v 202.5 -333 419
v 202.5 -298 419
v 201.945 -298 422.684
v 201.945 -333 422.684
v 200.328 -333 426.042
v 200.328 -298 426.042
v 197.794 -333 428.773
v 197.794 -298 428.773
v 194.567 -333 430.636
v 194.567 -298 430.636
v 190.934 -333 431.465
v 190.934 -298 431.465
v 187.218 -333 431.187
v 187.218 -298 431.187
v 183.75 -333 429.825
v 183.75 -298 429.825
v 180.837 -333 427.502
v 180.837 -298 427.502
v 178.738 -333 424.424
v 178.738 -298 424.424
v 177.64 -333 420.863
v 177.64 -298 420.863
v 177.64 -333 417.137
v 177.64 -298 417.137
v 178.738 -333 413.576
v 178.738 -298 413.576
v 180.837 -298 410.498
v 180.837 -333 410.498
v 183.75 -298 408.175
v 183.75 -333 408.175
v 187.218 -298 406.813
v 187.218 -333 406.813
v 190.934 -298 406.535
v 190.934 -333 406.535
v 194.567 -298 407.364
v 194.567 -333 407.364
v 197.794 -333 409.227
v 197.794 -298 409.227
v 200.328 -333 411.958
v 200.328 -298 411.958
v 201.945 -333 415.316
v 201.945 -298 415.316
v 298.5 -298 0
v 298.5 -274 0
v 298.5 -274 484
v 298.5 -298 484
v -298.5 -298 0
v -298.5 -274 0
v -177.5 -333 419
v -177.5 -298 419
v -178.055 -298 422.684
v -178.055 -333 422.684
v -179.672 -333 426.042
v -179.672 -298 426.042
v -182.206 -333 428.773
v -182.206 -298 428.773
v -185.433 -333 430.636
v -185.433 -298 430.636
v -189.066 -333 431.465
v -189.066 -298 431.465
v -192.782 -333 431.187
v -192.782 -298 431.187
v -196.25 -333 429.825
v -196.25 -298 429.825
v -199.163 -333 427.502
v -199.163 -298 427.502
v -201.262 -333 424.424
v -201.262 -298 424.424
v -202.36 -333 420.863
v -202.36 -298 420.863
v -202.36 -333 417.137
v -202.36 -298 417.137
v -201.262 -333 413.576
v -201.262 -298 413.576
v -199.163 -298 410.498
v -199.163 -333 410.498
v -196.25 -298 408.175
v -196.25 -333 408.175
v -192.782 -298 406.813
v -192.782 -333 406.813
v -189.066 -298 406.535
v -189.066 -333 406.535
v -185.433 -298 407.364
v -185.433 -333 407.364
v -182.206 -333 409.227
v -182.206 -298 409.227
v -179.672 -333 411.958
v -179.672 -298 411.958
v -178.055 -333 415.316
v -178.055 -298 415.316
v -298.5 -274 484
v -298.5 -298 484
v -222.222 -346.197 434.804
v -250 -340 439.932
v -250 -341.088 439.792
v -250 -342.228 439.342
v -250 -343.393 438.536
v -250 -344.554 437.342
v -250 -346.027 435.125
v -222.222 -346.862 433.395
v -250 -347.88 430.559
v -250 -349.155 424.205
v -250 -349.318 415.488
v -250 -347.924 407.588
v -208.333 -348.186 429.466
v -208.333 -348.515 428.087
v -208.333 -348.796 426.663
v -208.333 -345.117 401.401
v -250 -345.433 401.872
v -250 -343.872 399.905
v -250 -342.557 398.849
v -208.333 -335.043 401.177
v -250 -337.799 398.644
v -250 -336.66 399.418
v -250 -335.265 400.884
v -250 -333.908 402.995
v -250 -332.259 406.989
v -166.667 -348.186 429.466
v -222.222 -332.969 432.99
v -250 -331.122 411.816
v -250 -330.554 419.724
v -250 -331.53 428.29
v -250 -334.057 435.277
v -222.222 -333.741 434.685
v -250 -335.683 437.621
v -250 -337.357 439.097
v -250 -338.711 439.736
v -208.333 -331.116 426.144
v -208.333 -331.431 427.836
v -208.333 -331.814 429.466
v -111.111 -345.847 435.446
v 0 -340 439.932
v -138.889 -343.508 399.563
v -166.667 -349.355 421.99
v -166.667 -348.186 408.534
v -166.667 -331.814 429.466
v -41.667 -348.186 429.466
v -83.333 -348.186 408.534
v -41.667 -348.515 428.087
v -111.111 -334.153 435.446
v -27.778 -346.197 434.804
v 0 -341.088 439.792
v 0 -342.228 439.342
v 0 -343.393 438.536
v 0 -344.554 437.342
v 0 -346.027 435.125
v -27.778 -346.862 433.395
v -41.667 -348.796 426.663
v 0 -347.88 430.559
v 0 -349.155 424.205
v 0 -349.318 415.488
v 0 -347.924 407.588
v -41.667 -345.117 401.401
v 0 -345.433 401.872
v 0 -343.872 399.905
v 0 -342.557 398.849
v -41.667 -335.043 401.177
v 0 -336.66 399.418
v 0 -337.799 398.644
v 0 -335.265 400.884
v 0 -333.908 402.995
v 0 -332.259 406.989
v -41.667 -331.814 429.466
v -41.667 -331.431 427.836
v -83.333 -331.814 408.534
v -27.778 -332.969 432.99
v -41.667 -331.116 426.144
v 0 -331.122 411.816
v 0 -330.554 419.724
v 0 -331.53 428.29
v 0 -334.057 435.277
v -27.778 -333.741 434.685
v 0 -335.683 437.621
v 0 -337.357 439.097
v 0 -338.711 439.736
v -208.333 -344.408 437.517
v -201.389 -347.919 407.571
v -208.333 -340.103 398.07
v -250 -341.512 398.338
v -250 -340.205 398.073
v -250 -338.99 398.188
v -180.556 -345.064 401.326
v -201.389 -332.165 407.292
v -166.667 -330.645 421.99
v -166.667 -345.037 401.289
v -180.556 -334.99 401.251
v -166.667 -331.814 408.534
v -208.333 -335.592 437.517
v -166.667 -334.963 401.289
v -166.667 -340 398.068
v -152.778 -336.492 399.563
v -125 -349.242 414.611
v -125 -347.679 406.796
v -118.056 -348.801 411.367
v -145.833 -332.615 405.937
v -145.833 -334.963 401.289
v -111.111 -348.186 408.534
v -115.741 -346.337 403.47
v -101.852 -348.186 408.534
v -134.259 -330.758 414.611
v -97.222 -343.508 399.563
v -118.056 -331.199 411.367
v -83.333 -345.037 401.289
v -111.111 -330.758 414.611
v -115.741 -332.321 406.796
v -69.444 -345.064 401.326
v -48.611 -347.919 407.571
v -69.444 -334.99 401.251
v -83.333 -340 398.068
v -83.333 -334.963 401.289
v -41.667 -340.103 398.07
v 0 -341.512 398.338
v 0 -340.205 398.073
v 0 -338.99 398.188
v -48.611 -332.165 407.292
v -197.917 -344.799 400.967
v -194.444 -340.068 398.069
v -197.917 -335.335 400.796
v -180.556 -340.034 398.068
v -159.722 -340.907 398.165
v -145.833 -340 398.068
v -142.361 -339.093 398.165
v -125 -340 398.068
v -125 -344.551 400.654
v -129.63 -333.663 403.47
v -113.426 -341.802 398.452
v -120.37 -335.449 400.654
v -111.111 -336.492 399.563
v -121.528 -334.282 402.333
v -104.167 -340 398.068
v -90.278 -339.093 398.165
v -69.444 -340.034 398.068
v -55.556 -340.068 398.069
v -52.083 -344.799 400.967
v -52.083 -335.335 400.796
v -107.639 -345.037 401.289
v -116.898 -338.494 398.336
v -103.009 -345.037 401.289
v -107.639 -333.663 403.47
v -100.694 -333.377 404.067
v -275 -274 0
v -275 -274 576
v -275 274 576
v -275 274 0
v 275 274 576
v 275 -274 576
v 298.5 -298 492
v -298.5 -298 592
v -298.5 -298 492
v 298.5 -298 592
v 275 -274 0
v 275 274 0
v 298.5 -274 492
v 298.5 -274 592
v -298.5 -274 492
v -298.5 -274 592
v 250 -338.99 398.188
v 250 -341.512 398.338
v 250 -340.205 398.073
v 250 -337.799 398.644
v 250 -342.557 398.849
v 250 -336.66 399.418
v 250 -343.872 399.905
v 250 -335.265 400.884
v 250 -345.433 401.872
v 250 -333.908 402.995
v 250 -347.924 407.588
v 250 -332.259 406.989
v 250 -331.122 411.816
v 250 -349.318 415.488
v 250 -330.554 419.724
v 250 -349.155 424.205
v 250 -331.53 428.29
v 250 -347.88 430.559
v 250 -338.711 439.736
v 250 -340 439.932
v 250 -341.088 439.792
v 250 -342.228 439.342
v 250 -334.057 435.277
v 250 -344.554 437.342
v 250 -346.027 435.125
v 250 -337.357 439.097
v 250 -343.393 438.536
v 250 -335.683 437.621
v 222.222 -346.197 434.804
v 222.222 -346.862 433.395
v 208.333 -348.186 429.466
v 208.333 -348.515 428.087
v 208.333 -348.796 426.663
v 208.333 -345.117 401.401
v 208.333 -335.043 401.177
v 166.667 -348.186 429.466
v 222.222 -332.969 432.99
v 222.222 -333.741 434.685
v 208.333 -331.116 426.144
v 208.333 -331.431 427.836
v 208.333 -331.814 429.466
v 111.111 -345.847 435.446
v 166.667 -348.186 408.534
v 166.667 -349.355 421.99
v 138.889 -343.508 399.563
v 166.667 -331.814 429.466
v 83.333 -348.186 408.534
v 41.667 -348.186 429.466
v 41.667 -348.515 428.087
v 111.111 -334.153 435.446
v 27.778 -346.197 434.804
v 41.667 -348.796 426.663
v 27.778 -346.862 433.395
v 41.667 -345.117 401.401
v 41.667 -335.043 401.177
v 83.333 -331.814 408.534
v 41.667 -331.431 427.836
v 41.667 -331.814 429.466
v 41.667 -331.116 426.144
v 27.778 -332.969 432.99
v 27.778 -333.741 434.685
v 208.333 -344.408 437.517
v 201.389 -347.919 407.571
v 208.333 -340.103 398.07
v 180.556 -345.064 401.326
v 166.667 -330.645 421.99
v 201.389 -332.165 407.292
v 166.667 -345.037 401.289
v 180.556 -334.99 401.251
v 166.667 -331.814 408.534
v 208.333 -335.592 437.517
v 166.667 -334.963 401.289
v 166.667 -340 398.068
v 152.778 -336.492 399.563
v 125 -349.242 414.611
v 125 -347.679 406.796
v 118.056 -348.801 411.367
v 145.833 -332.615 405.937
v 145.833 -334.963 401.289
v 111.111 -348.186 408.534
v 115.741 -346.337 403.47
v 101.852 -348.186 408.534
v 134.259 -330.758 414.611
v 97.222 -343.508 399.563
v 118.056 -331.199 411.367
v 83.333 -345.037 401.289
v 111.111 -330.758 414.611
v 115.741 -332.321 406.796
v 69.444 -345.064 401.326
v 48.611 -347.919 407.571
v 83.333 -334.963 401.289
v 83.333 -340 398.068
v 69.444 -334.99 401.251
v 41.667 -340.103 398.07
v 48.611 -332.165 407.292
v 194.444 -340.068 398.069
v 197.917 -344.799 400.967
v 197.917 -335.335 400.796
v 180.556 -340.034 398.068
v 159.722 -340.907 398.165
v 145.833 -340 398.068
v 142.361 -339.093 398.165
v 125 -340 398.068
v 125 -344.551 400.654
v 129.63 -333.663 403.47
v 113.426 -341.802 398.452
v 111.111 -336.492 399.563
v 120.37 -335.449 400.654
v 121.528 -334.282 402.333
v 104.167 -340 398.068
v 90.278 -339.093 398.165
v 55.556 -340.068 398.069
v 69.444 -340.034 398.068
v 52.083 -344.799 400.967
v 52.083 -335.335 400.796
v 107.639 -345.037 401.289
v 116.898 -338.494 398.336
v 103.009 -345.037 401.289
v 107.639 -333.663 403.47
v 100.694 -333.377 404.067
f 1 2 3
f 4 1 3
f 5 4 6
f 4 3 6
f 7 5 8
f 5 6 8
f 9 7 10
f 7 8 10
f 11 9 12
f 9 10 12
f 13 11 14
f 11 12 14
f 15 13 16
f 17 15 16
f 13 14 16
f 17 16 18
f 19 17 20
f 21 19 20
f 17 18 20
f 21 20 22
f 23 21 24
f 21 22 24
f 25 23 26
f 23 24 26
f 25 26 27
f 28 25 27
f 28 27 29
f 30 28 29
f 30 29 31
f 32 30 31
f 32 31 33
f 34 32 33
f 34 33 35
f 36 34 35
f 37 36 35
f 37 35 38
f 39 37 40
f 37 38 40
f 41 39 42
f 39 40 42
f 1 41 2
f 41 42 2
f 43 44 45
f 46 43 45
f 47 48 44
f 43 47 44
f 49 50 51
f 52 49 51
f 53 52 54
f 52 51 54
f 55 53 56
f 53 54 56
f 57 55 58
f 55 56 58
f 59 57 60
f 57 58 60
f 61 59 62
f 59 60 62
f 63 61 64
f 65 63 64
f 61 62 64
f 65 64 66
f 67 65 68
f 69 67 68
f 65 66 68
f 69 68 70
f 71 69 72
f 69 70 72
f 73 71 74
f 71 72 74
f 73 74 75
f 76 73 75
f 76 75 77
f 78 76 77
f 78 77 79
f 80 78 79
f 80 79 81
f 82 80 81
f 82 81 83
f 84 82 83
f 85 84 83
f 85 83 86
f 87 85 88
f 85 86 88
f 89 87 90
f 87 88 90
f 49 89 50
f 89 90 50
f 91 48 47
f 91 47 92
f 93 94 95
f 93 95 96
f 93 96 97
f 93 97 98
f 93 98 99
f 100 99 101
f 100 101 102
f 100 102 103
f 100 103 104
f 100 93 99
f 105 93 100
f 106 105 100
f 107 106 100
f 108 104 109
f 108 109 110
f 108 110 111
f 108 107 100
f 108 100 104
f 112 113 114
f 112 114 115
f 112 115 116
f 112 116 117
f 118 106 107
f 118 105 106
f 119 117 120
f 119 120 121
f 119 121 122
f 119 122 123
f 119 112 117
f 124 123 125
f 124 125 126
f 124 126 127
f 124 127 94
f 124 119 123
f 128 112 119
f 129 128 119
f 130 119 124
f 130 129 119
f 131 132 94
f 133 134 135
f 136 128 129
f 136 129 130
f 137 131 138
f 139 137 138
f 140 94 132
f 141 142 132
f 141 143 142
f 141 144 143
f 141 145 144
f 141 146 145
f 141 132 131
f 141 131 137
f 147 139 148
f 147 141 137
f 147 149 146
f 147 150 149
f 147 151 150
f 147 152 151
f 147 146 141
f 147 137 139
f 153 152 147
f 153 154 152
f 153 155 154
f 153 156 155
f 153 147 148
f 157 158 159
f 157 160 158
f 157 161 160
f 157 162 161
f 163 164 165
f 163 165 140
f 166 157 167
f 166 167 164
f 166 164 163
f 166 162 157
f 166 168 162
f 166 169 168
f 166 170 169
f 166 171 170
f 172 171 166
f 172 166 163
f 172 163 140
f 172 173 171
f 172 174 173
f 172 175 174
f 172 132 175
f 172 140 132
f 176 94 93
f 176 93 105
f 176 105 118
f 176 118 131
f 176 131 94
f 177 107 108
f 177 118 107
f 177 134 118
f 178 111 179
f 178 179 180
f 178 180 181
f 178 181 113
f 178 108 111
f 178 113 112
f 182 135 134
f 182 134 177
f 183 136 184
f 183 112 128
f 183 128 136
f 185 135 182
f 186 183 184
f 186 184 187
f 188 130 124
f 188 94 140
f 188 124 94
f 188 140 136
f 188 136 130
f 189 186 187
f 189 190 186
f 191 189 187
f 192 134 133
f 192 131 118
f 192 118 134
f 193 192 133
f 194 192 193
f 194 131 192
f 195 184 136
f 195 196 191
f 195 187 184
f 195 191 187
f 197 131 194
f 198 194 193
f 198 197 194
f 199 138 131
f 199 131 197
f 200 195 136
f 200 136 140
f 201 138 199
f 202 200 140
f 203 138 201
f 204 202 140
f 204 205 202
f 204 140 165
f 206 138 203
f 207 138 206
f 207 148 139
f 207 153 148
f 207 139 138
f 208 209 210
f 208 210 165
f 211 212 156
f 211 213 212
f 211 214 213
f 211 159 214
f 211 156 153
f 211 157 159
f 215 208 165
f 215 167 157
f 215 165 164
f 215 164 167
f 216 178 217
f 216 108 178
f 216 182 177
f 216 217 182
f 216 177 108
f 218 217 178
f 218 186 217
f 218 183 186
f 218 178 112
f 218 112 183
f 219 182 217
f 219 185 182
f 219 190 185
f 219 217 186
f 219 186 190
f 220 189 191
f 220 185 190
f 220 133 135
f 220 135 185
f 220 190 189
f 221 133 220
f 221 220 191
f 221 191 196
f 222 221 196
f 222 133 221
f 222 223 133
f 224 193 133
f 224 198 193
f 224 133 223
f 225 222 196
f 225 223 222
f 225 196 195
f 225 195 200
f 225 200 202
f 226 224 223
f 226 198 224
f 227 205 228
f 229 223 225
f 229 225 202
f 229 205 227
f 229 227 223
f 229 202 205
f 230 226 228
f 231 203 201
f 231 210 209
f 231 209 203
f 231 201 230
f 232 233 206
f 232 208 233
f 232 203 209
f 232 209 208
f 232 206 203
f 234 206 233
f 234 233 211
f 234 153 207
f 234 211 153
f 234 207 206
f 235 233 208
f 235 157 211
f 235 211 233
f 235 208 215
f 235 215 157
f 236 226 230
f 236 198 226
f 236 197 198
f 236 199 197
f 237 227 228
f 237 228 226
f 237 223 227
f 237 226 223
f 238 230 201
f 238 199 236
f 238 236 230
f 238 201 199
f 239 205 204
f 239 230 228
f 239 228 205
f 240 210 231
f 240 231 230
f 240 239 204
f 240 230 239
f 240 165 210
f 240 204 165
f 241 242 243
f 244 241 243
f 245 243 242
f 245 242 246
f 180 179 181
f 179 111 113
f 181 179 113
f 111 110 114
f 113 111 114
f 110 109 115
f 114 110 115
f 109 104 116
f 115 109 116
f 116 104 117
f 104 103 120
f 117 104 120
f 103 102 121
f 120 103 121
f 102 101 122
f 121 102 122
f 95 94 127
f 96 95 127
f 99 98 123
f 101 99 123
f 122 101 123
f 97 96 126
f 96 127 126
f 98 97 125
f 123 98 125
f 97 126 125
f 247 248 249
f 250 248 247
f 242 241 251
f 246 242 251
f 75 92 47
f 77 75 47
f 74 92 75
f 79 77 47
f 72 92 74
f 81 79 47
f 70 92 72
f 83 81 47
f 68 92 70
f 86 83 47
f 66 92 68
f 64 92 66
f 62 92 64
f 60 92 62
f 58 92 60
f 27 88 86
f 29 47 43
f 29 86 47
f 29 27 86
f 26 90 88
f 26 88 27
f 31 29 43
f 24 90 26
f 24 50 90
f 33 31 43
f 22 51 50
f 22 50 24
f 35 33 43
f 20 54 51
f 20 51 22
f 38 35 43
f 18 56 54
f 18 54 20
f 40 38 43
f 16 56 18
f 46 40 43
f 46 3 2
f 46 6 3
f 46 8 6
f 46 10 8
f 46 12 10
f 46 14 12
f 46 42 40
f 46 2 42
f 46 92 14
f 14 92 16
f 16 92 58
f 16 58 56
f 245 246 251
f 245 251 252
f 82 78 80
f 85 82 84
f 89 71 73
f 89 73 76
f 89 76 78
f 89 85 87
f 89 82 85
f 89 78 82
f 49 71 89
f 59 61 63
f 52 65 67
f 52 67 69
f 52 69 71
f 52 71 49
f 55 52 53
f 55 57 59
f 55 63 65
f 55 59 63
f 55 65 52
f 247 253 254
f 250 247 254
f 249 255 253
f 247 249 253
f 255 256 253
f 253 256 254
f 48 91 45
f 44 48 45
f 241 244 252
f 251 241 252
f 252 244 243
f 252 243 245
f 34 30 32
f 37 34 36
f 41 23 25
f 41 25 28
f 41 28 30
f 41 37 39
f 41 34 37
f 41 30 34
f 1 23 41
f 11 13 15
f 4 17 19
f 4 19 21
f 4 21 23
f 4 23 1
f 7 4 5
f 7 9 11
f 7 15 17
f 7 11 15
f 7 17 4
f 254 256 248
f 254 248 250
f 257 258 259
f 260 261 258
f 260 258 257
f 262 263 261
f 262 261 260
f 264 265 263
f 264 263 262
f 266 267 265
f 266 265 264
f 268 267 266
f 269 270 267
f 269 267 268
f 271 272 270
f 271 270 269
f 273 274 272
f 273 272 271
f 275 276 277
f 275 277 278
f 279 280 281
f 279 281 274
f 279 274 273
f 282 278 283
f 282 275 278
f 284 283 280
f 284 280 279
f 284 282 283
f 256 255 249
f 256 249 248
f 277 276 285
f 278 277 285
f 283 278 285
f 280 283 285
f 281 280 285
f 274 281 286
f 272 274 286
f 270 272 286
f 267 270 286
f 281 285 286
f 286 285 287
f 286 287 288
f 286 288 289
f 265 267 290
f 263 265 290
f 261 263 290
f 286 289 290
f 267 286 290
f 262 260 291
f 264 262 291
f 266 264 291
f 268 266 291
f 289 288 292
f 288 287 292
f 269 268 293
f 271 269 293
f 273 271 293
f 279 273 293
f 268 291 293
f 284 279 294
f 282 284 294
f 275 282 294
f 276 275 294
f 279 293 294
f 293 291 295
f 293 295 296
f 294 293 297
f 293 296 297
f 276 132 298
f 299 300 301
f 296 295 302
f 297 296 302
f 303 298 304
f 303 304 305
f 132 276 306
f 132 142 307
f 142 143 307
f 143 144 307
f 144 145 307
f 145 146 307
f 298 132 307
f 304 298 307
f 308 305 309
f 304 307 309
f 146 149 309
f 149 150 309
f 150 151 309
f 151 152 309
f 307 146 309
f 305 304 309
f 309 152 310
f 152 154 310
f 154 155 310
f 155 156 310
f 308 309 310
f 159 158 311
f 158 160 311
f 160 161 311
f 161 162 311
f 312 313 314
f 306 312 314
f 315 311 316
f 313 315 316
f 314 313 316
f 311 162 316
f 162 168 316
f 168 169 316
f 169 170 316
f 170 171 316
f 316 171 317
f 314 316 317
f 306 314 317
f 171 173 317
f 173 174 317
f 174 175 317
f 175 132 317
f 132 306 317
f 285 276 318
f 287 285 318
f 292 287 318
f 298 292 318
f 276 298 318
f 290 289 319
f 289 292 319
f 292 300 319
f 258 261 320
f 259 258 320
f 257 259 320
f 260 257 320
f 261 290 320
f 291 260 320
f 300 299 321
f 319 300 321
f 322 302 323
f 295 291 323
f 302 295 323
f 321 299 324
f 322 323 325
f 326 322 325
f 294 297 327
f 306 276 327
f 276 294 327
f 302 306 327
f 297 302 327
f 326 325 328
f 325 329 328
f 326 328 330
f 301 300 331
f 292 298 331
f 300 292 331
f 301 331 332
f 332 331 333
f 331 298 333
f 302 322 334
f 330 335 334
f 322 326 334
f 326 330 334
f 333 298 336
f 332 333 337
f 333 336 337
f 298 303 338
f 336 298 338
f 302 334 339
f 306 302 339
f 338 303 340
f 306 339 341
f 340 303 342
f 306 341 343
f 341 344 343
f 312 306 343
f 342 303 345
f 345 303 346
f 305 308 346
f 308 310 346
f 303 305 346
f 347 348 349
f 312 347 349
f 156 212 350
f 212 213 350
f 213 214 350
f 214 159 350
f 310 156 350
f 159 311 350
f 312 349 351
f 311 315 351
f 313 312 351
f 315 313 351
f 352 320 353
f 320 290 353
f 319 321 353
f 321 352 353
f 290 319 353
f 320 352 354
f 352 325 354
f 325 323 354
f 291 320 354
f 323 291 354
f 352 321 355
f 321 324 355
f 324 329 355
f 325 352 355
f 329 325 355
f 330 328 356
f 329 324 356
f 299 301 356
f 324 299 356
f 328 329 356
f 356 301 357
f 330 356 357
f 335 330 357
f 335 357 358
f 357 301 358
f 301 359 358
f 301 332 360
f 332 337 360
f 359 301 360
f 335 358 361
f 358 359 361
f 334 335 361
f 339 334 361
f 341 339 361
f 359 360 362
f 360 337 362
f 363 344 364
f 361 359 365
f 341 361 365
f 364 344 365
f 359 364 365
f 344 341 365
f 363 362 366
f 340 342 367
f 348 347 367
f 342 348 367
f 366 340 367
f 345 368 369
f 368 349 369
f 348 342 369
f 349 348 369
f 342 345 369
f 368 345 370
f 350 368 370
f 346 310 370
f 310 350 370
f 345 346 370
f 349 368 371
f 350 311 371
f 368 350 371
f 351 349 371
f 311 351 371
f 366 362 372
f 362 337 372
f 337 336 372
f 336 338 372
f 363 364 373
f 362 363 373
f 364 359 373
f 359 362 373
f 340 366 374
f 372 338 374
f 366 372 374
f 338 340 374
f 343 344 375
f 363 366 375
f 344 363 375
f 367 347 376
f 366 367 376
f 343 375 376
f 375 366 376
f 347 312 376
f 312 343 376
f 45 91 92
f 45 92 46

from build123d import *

# Parameters (mm, degrees)
F0_W          = 550
F0_H          = 548
F1_DEPTH      = 576
F2_W          = 597
F2_H          = 100
F2_H_2        = 484
F3_DEPTH      = 24
F4_R          = 12.5
F5_DEPTH      = 35
F7_DEPTH      = 250
F7_DEPTH_BACK = 250


with BuildPart() as f1:
    # F0 (on Top) → F1 (new body)
    with BuildSketch(Plane.XY):
        Rectangle(F0_W, F0_H)
    extrude(amount=F1_DEPTH)


with BuildPart() as f3:
    # F2 (on face) → F3 (new body)
    with BuildSketch(Plane.XZ.offset(274)):
        with Locations((0, 542)):
            Rectangle(F2_W, F2_H)
        with Locations((0, 242)):
            Rectangle(F2_W, F2_H_2)
    extrude(amount=F3_DEPTH)

    # F4 (on face) → F5 (join)
    with BuildSketch(Plane.XZ.offset(298)):
        with Locations((-190, 419)):
            Circle(F4_R)
        with Locations((190, 419)):
            Circle(F4_R)
    extrude(amount=F5_DEPTH)


with BuildPart() as f7:
    # F6 (on Right) → F7 (new body, two sides)
    with BuildSketch(Plane.YZ) as f7_sk:
        with BuildLine():
            add(Edge.make_bspline(
                [(-340, 439.931727), (-356.371177, 439.931727), (-348.185589, 408.534136), (-340, 377.136546), (-331.814411, 408.534136), (-323.628823, 439.931727), (-340, 439.931727)],
                knots=[0, 0, 0, 2.094395, 2.094395, 4.18879, 4.18879, 6.283185, 6.283185, 6.283185], degree=2, weights=[1, 0.5, 1, 0.5, 1, 0.5, 1]))
        make_face()
    extrude(amount=F7_DEPTH)
    extrude(f7_sk.sketch, amount=-F7_DEPTH_BACK)


solid = Compound([f1.part, f3.part, f7.part])
